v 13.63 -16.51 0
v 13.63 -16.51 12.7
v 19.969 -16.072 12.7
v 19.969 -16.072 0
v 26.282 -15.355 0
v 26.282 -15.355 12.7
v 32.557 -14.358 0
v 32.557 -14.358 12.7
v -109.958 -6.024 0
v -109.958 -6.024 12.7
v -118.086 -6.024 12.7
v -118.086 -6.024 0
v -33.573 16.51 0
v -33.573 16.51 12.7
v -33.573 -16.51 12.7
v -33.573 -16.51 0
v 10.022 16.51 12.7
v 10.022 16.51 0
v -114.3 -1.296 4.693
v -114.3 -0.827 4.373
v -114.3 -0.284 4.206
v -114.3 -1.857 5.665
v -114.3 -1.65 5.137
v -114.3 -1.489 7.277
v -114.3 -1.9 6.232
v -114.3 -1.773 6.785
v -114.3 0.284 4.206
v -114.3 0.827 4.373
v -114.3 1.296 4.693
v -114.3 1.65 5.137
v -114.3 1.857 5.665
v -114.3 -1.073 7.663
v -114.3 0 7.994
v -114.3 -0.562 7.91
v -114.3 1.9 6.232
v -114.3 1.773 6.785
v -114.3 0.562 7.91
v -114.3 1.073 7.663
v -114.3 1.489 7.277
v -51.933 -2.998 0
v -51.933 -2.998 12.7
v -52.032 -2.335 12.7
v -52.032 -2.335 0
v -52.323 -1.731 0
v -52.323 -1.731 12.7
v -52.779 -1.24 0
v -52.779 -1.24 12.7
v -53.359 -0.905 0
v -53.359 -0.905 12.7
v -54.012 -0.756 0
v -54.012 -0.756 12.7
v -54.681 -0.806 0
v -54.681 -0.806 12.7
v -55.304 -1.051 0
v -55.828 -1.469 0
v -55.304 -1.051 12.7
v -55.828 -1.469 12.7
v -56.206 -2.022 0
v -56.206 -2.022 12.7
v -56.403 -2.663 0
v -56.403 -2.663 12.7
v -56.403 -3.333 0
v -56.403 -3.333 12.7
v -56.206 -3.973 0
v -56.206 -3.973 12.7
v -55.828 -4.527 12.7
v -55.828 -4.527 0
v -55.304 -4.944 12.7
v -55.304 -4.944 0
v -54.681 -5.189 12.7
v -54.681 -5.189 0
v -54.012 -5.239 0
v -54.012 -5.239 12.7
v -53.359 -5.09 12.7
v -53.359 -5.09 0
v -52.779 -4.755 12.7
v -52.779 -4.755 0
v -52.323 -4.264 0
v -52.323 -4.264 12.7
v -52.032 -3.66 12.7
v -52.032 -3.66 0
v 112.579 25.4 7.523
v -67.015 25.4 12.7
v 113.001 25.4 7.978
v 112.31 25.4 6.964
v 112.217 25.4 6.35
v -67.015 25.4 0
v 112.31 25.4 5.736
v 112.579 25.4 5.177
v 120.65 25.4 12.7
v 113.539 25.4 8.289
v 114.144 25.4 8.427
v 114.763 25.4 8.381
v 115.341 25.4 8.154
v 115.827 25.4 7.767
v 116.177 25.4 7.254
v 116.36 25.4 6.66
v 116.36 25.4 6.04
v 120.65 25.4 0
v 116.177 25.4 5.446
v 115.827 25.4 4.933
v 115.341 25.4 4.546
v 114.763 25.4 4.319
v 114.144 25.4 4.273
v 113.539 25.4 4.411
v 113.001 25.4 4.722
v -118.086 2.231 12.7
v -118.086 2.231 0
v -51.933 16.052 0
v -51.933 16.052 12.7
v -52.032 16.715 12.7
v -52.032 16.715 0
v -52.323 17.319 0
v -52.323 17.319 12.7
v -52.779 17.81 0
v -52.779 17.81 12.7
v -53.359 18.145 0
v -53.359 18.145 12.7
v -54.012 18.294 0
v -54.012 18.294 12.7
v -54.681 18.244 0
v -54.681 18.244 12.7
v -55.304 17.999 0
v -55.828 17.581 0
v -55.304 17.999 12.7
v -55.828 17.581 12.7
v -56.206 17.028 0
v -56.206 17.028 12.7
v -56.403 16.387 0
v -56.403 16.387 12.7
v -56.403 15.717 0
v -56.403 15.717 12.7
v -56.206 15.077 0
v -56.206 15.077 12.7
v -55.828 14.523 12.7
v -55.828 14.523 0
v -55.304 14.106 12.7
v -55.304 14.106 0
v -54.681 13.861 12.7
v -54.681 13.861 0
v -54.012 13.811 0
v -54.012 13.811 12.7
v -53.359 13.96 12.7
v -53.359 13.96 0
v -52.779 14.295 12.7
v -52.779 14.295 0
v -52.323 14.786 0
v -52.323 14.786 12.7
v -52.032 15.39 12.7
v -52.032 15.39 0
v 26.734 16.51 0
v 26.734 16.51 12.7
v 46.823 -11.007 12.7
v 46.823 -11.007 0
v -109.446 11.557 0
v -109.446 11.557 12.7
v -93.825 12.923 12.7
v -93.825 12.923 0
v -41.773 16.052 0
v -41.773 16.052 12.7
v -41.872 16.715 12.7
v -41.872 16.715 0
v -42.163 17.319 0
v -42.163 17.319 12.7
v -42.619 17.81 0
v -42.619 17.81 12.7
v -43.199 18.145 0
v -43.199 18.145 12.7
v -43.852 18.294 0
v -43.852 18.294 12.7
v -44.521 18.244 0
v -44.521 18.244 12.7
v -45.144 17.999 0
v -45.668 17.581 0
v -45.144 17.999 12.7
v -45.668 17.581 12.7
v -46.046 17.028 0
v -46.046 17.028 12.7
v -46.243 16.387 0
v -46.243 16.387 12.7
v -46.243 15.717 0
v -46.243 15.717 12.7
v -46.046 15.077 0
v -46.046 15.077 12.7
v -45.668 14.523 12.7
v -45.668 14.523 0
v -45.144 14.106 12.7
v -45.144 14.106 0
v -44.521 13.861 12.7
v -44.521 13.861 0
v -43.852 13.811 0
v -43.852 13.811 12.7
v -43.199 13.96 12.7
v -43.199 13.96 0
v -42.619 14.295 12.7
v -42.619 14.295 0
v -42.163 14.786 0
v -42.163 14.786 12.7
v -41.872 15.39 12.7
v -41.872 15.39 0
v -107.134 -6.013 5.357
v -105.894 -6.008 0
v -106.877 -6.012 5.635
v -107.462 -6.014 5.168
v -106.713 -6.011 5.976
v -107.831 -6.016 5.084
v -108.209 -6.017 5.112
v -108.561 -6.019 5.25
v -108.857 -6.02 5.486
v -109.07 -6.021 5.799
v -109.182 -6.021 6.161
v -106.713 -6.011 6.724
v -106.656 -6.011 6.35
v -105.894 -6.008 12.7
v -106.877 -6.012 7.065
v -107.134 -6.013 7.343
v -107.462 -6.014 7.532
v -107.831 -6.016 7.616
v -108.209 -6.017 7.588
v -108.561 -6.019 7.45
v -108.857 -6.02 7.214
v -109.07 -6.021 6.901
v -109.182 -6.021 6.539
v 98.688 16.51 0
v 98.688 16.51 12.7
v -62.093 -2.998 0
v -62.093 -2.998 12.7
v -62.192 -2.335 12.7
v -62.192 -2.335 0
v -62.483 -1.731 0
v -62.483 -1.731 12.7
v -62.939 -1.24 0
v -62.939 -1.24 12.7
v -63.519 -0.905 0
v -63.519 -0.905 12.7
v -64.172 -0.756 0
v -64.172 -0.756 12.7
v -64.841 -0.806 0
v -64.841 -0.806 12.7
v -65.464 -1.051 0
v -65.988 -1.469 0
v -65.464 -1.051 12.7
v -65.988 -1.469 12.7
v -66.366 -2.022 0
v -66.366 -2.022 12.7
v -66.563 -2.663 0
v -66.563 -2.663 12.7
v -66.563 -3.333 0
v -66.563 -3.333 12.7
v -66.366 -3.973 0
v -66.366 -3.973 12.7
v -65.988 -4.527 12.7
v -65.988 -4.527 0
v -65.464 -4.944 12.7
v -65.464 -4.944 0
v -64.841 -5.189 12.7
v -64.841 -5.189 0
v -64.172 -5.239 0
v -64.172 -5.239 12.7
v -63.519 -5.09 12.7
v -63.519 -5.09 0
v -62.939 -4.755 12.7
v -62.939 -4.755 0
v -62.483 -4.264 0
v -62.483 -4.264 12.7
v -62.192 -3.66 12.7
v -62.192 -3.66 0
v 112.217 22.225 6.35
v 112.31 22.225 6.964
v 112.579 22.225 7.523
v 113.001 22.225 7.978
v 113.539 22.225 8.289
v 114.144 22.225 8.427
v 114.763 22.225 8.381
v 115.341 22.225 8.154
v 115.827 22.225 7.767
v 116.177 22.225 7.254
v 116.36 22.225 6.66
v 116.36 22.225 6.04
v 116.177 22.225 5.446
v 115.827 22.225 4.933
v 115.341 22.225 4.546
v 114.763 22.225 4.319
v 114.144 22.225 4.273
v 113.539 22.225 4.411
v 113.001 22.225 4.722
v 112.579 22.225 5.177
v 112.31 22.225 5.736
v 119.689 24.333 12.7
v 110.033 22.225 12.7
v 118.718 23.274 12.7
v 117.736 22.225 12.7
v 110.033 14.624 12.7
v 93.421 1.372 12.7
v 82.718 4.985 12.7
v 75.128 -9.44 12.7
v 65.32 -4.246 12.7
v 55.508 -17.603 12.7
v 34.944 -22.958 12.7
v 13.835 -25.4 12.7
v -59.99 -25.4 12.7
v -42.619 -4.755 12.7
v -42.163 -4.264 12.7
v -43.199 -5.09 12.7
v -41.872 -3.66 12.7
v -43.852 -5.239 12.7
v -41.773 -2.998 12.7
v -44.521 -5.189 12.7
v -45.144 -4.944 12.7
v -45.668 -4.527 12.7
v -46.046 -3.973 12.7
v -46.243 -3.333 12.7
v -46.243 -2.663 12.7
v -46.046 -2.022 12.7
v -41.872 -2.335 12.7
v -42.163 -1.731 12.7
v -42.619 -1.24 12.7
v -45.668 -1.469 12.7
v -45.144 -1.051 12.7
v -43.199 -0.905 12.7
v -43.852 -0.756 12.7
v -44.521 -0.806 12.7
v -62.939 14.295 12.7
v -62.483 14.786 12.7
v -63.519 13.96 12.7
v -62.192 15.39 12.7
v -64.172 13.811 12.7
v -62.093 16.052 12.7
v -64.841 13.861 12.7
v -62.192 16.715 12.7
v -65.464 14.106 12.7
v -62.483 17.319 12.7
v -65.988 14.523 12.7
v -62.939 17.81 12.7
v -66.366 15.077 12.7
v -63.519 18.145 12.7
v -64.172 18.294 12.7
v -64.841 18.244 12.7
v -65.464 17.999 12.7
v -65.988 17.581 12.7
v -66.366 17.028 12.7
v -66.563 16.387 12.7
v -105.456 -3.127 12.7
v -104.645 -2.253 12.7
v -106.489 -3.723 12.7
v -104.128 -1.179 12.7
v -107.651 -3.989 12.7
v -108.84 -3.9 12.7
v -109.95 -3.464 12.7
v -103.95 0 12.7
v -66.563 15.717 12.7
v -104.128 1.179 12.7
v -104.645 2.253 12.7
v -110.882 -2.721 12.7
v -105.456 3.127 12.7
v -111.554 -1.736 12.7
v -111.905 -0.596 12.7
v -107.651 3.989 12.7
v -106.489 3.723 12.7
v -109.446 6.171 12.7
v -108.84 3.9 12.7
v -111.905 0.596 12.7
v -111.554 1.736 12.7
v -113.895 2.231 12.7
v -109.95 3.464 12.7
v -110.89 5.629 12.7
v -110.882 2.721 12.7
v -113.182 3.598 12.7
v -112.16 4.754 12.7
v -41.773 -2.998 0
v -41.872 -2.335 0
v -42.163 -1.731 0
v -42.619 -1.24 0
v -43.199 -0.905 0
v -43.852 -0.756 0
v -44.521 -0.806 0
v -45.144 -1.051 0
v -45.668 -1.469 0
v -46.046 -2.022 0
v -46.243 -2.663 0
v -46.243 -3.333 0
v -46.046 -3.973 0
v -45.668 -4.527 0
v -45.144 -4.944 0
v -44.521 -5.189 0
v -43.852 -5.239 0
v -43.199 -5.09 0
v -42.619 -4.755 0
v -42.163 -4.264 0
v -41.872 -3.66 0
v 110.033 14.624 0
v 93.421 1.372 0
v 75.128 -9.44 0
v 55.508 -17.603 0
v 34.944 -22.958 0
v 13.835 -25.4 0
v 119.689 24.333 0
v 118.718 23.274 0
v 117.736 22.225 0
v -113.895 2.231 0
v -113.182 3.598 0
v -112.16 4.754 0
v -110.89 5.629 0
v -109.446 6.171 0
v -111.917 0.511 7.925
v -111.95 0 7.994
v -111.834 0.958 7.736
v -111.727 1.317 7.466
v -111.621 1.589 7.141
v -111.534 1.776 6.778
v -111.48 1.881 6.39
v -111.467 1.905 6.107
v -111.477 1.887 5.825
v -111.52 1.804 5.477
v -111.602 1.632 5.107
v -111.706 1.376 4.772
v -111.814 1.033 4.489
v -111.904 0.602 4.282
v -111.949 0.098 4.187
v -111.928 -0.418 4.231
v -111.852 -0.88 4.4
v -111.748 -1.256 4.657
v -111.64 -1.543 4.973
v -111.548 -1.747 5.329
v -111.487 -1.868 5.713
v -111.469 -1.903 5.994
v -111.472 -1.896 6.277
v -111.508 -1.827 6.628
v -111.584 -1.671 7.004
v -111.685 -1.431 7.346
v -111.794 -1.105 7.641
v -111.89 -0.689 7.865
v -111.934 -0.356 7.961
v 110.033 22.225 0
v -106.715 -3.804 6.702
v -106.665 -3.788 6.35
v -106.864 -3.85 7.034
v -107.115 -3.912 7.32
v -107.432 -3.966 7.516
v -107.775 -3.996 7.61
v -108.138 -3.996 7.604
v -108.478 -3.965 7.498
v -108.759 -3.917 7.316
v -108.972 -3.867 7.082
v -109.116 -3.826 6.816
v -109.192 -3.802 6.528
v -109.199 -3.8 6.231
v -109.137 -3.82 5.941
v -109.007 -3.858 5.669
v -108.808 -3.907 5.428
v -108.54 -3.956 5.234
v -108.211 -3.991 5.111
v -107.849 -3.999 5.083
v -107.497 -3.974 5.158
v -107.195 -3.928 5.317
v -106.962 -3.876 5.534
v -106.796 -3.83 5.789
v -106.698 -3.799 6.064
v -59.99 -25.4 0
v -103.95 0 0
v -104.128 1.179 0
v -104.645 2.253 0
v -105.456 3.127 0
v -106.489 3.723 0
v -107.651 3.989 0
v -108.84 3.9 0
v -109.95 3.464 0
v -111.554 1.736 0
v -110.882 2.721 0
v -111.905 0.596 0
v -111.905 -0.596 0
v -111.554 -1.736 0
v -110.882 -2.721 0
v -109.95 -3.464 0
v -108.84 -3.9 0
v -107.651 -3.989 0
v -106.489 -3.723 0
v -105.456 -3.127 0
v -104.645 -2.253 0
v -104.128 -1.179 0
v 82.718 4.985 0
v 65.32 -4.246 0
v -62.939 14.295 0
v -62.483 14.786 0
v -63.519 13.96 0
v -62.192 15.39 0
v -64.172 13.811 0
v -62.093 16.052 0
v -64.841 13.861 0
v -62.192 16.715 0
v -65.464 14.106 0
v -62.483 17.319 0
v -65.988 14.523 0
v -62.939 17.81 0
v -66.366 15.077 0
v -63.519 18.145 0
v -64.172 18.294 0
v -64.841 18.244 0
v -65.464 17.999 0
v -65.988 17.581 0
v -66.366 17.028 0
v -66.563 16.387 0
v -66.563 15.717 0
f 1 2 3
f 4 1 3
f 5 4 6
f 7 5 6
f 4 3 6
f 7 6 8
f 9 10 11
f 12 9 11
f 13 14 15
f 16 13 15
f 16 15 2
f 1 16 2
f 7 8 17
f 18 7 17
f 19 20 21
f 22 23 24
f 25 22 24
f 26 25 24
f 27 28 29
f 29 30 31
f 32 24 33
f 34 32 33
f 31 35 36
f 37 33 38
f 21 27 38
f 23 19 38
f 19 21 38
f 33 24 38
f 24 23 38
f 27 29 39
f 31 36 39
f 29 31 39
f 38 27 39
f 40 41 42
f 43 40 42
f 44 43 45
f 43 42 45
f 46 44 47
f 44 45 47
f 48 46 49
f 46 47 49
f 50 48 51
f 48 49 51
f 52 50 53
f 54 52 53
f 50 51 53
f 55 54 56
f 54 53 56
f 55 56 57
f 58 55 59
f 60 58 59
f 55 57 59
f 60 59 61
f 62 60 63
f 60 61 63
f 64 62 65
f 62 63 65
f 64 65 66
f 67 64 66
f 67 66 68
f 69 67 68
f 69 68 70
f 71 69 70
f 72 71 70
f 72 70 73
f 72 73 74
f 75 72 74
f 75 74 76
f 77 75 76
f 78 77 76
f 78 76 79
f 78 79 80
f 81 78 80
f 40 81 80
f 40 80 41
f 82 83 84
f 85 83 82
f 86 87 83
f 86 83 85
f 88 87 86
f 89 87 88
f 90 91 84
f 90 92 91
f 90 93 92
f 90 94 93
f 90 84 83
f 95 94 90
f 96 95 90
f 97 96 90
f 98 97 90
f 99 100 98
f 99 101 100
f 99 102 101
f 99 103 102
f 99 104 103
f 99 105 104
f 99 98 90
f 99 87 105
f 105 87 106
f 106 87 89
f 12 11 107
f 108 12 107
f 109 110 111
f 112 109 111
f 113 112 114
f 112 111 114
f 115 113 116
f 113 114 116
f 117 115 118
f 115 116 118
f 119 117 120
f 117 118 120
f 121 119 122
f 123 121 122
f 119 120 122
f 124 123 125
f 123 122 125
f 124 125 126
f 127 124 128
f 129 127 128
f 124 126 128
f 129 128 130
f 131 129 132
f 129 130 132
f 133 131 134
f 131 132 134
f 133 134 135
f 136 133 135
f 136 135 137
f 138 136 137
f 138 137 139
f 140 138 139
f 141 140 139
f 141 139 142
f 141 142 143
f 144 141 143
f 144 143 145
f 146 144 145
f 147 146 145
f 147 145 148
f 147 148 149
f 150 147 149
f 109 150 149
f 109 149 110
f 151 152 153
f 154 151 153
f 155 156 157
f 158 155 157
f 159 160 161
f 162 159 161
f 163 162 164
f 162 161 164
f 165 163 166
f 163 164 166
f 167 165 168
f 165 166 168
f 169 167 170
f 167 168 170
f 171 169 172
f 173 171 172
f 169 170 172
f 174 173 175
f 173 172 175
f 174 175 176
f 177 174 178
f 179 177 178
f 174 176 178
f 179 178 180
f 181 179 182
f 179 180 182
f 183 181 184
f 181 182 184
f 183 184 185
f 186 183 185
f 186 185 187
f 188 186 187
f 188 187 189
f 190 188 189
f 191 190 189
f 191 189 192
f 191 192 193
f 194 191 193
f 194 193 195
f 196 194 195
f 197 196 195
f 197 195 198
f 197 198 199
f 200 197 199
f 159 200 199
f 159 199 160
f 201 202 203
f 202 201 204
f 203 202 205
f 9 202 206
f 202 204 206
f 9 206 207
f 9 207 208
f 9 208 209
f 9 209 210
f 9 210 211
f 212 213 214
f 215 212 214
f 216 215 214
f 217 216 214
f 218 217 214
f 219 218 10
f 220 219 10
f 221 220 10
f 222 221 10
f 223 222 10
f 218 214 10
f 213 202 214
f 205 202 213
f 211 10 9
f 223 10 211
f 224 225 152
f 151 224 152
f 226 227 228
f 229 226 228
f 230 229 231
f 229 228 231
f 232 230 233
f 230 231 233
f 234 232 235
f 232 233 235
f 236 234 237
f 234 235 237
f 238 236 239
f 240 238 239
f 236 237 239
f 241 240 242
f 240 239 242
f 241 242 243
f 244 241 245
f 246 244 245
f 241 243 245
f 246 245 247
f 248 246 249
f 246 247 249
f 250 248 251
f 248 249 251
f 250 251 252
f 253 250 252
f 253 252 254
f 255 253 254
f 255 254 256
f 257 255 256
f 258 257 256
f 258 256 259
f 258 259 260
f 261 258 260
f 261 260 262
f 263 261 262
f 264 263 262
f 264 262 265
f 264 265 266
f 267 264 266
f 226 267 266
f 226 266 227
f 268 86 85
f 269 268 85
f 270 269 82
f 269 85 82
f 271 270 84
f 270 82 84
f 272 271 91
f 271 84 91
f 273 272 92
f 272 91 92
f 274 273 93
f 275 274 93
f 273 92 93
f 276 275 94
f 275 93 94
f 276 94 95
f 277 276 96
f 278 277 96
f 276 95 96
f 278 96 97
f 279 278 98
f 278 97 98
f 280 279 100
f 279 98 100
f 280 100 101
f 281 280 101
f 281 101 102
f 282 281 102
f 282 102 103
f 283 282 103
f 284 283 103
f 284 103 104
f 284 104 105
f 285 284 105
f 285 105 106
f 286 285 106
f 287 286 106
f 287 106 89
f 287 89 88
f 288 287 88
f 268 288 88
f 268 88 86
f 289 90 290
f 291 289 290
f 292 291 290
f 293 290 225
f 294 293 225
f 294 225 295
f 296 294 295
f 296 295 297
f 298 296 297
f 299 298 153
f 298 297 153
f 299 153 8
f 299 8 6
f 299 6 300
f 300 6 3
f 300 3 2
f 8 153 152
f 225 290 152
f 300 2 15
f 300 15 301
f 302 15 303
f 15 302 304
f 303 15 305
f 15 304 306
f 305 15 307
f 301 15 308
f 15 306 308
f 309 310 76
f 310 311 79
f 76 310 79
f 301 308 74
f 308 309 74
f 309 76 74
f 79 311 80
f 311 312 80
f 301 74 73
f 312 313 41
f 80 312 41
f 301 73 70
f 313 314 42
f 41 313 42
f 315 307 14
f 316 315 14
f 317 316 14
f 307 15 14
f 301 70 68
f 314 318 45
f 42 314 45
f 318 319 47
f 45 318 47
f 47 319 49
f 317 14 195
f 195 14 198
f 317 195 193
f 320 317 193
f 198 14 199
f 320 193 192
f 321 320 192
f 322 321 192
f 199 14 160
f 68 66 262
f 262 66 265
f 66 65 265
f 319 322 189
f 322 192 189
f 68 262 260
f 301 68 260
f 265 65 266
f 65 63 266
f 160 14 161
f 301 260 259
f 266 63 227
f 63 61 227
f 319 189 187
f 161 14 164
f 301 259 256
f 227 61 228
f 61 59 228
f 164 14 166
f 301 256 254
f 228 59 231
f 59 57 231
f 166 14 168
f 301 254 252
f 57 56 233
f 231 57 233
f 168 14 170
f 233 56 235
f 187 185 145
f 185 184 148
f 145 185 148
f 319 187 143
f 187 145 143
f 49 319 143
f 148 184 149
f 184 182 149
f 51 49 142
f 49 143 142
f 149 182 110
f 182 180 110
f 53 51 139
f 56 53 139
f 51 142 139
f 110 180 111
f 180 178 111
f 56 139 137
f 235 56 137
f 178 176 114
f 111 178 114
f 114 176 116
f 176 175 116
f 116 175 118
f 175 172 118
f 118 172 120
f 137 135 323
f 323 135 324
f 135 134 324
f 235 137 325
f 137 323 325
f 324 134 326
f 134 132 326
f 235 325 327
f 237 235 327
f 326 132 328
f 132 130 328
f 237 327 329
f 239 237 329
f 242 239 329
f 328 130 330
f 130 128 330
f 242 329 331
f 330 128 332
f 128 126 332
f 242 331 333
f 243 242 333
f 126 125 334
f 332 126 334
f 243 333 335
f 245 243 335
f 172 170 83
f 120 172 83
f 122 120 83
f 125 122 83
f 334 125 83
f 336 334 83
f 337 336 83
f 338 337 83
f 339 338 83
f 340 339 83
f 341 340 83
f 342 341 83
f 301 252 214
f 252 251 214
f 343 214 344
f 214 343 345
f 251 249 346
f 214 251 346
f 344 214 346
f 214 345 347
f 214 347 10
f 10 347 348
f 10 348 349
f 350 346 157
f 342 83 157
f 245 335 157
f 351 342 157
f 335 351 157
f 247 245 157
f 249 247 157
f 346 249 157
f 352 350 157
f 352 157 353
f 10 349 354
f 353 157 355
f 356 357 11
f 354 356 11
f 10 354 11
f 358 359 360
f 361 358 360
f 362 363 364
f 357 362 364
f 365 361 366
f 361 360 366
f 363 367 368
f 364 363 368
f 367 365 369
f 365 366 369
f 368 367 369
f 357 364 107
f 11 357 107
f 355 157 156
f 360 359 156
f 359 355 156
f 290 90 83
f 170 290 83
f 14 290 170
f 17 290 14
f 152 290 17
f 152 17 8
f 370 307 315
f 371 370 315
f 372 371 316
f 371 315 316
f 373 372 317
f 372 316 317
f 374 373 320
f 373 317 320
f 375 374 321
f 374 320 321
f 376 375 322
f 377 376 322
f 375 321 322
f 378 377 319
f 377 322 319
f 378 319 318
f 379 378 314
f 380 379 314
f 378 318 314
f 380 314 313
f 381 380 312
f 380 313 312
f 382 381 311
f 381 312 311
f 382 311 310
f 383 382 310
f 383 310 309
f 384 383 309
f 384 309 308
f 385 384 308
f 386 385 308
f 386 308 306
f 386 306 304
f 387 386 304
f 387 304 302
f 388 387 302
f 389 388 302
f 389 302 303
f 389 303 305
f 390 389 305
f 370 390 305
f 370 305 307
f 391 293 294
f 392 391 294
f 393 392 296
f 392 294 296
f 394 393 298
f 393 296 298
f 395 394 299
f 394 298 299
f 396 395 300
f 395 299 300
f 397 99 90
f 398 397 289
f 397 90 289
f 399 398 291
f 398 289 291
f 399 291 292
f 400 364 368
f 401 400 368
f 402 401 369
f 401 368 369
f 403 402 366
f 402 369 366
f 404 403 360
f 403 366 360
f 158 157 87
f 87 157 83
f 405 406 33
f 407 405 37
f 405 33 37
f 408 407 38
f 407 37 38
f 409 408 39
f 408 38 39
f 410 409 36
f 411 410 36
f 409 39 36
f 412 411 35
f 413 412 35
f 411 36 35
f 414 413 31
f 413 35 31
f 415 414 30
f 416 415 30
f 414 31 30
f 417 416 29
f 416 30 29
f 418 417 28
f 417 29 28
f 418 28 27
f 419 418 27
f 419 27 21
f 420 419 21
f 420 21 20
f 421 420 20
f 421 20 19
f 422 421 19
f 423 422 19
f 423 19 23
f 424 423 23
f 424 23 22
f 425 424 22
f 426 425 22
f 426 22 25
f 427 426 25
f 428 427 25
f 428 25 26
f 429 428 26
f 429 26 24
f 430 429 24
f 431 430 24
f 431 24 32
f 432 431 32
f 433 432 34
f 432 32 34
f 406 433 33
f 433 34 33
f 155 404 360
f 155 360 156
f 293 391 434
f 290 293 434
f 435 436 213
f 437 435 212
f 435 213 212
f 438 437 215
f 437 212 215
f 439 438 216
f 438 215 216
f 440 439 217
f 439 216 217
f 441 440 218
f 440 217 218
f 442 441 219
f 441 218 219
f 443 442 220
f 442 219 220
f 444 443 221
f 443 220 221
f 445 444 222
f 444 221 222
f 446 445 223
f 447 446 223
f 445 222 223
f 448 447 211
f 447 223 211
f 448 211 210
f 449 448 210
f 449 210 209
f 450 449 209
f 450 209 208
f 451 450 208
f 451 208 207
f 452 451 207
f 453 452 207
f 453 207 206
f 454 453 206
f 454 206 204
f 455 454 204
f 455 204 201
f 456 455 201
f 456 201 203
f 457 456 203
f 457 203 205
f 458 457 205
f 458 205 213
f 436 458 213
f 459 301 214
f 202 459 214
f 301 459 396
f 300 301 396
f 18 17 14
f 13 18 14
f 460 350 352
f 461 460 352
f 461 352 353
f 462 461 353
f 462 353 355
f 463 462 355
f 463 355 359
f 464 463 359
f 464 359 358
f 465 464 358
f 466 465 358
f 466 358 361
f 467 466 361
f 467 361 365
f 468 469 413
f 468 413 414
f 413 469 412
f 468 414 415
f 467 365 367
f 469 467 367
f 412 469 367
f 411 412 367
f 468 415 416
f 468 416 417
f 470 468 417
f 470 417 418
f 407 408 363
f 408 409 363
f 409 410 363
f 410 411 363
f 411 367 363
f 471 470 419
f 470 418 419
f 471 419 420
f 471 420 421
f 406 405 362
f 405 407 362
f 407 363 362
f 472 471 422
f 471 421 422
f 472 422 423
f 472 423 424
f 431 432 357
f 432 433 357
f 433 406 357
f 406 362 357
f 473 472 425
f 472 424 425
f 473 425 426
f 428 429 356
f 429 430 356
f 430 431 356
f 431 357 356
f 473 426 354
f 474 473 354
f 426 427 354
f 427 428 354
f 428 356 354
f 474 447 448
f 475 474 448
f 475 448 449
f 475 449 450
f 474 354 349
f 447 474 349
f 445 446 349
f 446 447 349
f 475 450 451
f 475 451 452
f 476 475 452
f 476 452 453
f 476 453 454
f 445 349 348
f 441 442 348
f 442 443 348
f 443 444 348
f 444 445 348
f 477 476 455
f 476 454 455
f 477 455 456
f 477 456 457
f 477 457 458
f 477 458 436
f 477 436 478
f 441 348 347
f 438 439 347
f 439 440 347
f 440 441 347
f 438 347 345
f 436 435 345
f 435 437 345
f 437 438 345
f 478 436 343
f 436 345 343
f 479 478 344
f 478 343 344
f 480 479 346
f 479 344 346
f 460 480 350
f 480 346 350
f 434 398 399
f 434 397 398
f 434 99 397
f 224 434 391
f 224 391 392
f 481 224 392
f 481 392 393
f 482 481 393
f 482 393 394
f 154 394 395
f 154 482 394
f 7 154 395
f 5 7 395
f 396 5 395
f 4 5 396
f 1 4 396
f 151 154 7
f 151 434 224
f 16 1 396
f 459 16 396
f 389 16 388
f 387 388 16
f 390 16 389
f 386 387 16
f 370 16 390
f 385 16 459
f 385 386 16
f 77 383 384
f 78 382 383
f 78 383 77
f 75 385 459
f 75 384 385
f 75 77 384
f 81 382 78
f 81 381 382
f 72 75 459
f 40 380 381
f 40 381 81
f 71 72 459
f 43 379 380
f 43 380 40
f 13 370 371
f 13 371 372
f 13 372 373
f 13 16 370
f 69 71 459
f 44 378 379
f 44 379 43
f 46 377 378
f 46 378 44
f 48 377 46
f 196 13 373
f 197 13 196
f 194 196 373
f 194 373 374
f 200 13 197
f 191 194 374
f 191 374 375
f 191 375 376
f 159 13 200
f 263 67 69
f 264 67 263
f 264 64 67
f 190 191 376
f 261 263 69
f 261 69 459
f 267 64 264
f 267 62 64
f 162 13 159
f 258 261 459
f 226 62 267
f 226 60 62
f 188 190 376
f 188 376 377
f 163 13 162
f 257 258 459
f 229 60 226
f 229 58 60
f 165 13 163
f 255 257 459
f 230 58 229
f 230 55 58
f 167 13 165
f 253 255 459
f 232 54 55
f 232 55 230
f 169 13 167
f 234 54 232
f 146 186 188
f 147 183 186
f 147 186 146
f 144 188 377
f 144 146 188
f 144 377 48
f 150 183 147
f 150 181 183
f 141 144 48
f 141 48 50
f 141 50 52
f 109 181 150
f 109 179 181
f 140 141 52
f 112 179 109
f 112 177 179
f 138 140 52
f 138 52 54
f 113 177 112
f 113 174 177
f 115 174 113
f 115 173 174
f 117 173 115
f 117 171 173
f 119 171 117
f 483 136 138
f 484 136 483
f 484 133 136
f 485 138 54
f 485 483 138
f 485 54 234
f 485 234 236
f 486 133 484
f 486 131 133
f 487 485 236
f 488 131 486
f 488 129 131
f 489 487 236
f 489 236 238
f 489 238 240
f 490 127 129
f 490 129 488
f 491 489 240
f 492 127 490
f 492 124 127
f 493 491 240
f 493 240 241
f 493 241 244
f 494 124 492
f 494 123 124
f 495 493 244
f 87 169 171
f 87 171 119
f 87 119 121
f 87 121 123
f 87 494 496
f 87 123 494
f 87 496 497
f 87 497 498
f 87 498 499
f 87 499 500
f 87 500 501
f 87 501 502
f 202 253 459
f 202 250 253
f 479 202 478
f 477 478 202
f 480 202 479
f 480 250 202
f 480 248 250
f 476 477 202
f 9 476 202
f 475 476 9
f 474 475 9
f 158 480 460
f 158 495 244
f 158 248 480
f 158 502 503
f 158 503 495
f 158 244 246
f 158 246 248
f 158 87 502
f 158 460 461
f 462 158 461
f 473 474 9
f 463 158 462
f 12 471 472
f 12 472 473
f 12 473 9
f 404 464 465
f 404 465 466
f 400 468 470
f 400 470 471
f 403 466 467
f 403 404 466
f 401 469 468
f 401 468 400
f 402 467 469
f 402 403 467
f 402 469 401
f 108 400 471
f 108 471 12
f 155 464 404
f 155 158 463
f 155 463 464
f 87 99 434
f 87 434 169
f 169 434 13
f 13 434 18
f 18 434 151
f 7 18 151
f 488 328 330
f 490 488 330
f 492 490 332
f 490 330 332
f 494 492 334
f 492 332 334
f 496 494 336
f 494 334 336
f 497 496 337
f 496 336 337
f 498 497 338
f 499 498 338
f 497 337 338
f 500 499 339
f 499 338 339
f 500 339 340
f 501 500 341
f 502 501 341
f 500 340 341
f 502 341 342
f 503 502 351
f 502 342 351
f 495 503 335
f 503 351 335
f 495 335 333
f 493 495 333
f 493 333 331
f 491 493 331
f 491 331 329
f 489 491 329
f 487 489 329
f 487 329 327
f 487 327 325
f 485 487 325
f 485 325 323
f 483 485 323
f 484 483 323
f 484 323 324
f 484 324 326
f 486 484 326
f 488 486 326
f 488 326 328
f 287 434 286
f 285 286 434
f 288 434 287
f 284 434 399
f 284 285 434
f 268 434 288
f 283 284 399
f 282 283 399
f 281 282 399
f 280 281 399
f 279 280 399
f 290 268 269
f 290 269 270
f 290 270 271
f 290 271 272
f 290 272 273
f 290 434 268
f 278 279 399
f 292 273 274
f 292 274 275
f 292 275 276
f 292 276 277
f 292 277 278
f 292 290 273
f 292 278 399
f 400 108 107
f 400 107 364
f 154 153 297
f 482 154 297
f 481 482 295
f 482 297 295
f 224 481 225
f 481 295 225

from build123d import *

# Parameters (mm, degrees)
SKETCH1_W             = 241.3
SKETCH1_H             = 50.8
BOSS_EXTRUDE1_DEPTH   = 12.7
SKETCH3_R             = 4
CUT_EXTRUDE1_DEPTH    = 124.947055229
CUT_EXTRUDE2_DEPTH    = 124.947055229
F_8_CLEARANCE_HOLE1_D = 4.4958
SKETCH10_R            = 1.905
CUT_EXTRUDE3_DEPTH    = 5.08
BOSS_EXTRUDE2_DEPTH   = 12.7
CUT_EXTRUDE4_DEPTH    = 124.947055239
SKETCH14_R            = 1.27
CUT_EXTRUDE5_DEPTH    = 6.35
SKETCH15_W            = 7.607640742
SKETCH15_H            = 9.409671306
CUT_EXTRUDE6_DEPTH    = 124.947055239
SKETCH16_W            = 0.104572849
SKETCH16_H            = 0.14582332
CUT_EXTRUDE8_DEPTH    = 124.947055239
SKETCH18_R            = 2.0828
CUT_EXTRUDE9_DEPTH    = 132.523201385
LPATTERN1_COUNT       = 3
LPATTERN1_PITCH       = 10.16


with BuildPart() as part:
    # Sketch1 → Boss-Extrude1 (new body)
    with BuildSketch(Plane.XY):
        Rectangle(SKETCH1_W, SKETCH1_H)
    extrude(amount=BOSS_EXTRUDE1_DEPTH)

    # Sketch3 → Cut-Extrude1 (cut, through all)
    with BuildSketch(Plane.XY.offset(12.7)):
        with Locations((-107.95, 0)):
            Circle(SKETCH3_R)
    extrude(amount=-CUT_EXTRUDE1_DEPTH, mode=Mode.SUBTRACT)

    # Sketch5 → Cut-Extrude2 (cut, through all)
    with BuildSketch(Plane.XY.offset(12.7)):
        with BuildLine():
            Line((-59.990308431, -25.4), (-105.894198974, -6.008009832))
            Line((-105.894198974, -6.008009832), (-109.958209517, -6.024084539))
            Line((-109.958209517, -6.024084539), (-118.086209517, -6.024084539))
            Line((-118.086209517, -6.024084539), (-118.086209517, 2.230915461))
            Line((-118.086209517, 2.230915461), (-113.895209517, 2.230915461))
            ThreePointArc((-113.895209517, 2.230915461), (-111.566364668, 5.219617475), (-107.95, 6.35))
            Line((-107.95, 6.35), (-67.015128773, 25.4))
            Line((-67.015128773, 25.4), (-120.65, 25.4))
            Line((-120.65, 25.4), (-120.65, -25.4))
            Line((-120.65, -25.4), (-59.990308431, -25.4))
        make_face()
        with BuildLine():
            Line((120.65, -25.4), (120.65, 25.4))
            ThreePointArc((120.65, 25.4), (72.371753541, -10.785174559), (13.834903468, -25.4))
            Line((13.834903468, -25.4), (120.65, -25.4))
        make_face()
    extrude(amount=-CUT_EXTRUDE2_DEPTH, mode=Mode.SUBTRACT)

    # #8 Clearance Hole1 (through all)
    with Locations(Plane(origin=(0, 0, 0), x_dir=(-1, 0, 0), z_dir=(0, 0, -1))):
        with Locations((44.020428639, 16.052306877), (44.020428639, -2.997693123)):
            f_8_clearance_hole1 = Hole(F_8_CLEARANCE_HOLE1_D / 2)

    # Sketch10 → Cut-Extrude3 (cut)
    with BuildSketch(Plane.ZY.offset(114.3)):
        with Locations((6.089367744, 0)):
            Circle(SKETCH10_R)
    extrude(amount=-CUT_EXTRUDE3_DEPTH, mode=Mode.SUBTRACT)

    # Sketch11 → Boss-Extrude2 (add)
    with BuildSketch(Plane.XY.offset(12.7)):
        Polygon((-93.824923554, 12.923434781), (-109.445923554, 5.653836977), (-109.445923554, 11.556774368), align=None)
    extrude(amount=-BOSS_EXTRUDE2_DEPTH)

    # Sketch12 → Cut-Extrude4 (cut, through all)
    with BuildSketch(Plane.XY.offset(12.7)):
        with BuildLine():
            Line((10.021655843, 16.51), (-33.573281826, 16.51))
            Line((-33.573281826, 16.51), (-33.573281826, -16.51))
            Line((-33.573281826, -16.51), (13.63000586, -16.51))
            ThreePointArc((13.63000586, -16.51), (23.12933387, -15.748429471), (32.557173193, -14.358081305))
            Line((32.557173193, -14.358081305), (10.021655843, 16.51))
        make_face()
        with BuildLine():
            Line((26.733875346, 16.51), (46.823064271, -11.007216822))
            ThreePointArc((46.823064271, -11.007216822), (74.177600846, 0.070720235), (98.687628211, 16.51))
            Line((98.687628211, 16.51), (26.733875346, 16.51))
        make_face()
    extrude(amount=-CUT_EXTRUDE4_DEPTH, mode=Mode.SUBTRACT)

    # Sketch14 → Cut-Extrude5 (cut)
    with BuildSketch(Plane(origin=(0.022106899, -5.589070571, 0), x_dir=(0.9999921775754317, 0.003955349282477503, 0), z_dir=(0.003955349282477503, -0.9999921775754317, 0))):
        with Locations((-107.949155569, 6.35)):
            Circle(SKETCH14_R)
    extrude(amount=-CUT_EXTRUDE5_DEPTH, mode=Mode.SUBTRACT)

    # Sketch15 → Cut-Extrude6 (cut, through all)
    with BuildSketch(Plane.XY.offset(12.7)):
        with Locations((113.836536756, 17.520164347)):
            Rectangle(SKETCH15_W, SKETCH15_H)
    extrude(amount=-CUT_EXTRUDE6_DEPTH, mode=Mode.SUBTRACT)

    # Sketch16 → Cut-Extrude8 (cut, through all)
    with BuildSketch(Plane.XY.offset(12.7)):
        with Locations((117.692643551, 22.15208834)):
            Rectangle(SKETCH16_W, SKETCH16_H)
    extrude(amount=-CUT_EXTRUDE8_DEPTH, mode=Mode.SUBTRACT)

    # Sketch18 → Cut-Extrude9 (cut, through all)
    with BuildSketch(Plane(origin=(0, 25.4, 0), x_dir=(1, 0, 0), z_dir=(0, 1, 0))):
        with Locations(Location((114.3, -6.35, 0), (0, 0, 180))):
            Circle(SKETCH18_R)
    extrude(amount=-CUT_EXTRUDE9_DEPTH, mode=Mode.SUBTRACT)

    # LPattern1: #8 Clearance Hole1 ×3
    with Locations(*[(-i * LPATTERN1_PITCH, 0, 0) for i in range(1, LPATTERN1_COUNT)]):
        add(f_8_clearance_hole1, mode=Mode.SUBTRACT)


solid = part.part
